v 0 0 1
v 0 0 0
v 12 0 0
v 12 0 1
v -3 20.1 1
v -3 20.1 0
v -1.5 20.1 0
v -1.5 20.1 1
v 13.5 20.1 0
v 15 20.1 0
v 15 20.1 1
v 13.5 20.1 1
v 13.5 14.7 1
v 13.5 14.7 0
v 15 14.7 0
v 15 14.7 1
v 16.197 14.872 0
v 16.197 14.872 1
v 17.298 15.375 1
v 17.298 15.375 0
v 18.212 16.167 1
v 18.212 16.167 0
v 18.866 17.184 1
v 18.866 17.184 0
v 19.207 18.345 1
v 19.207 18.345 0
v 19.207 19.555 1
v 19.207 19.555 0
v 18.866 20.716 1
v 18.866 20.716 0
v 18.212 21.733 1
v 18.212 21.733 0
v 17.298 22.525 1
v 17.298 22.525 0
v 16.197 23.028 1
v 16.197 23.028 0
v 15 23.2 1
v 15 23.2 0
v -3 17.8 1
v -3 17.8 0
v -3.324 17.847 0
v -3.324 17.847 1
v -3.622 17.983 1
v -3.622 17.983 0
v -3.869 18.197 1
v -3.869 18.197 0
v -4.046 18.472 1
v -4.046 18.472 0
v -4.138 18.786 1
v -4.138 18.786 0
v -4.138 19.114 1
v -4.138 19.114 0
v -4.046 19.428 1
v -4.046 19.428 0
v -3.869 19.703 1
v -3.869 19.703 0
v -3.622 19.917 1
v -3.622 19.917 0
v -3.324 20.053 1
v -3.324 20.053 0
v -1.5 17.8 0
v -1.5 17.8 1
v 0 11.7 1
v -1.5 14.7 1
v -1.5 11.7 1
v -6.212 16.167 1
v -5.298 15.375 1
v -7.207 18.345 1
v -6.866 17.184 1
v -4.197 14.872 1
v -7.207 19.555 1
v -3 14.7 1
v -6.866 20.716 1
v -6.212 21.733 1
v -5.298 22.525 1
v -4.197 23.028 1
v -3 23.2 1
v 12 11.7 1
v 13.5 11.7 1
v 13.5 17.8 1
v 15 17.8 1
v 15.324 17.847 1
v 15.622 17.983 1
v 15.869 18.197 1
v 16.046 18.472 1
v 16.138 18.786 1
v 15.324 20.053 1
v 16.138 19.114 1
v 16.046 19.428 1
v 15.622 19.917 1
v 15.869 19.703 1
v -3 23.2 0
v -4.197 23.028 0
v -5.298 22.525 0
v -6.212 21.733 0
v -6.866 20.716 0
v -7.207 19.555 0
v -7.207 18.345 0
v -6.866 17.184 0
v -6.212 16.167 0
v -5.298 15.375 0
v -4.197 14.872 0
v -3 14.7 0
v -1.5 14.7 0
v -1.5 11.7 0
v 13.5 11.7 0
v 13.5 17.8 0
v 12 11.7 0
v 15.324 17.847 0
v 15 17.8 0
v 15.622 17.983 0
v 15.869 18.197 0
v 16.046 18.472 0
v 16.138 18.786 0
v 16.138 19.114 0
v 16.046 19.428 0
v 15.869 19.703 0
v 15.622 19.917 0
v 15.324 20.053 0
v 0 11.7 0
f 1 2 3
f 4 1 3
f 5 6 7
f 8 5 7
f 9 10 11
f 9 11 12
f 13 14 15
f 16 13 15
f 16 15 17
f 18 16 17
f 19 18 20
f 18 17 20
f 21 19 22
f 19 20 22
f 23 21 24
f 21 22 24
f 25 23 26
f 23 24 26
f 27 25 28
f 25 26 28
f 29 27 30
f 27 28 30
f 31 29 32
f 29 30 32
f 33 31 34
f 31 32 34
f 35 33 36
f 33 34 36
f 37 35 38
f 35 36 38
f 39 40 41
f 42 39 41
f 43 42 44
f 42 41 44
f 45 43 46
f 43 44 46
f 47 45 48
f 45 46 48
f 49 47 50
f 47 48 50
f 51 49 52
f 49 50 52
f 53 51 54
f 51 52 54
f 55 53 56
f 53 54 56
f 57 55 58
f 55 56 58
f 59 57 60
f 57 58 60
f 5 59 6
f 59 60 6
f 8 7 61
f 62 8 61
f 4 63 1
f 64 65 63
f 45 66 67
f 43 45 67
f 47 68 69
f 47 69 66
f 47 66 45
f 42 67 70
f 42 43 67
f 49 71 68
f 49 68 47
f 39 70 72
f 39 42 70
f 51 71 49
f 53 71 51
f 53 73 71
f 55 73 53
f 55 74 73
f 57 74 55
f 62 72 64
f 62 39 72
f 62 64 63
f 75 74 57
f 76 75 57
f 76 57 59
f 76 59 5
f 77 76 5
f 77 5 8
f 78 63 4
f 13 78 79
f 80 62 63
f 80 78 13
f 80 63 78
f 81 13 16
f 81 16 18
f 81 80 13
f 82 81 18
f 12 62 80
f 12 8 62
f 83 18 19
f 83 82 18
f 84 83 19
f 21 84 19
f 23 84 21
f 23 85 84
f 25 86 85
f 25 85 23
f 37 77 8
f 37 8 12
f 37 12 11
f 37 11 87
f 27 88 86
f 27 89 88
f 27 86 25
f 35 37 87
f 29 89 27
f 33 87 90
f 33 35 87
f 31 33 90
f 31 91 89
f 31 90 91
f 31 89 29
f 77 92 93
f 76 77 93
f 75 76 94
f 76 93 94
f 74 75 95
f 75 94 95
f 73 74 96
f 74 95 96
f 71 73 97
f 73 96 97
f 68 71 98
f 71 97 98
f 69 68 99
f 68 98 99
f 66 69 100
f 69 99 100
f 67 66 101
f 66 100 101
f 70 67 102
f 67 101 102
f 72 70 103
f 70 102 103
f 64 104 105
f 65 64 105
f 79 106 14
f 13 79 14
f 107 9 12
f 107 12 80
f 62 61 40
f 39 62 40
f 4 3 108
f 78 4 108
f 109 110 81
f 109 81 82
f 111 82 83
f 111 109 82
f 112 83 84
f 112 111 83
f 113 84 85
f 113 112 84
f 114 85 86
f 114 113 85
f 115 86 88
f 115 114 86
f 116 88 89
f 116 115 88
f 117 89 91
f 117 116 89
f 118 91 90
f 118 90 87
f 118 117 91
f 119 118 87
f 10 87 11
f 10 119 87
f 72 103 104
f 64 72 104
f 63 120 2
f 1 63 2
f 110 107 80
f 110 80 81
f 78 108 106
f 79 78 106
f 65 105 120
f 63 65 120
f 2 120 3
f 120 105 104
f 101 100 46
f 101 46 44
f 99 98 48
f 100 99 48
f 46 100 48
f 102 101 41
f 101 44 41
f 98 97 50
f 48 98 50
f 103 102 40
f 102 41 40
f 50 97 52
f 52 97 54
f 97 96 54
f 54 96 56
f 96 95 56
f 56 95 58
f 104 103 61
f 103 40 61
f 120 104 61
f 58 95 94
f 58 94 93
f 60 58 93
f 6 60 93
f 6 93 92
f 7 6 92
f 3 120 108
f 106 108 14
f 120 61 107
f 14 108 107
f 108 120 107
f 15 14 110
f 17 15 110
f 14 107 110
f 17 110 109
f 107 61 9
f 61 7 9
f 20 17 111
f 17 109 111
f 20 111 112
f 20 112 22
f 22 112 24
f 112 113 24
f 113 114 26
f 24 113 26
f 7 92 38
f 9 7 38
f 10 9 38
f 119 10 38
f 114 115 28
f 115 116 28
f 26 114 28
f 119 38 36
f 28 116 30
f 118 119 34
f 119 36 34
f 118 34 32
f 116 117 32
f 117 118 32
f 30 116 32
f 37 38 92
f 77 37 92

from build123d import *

# Parameters (mm, degrees)
BOSS_EXTRU_1_DEPTH = 1


with BuildPart() as part:
    # Esquisse1 → Boss.-Extru.1 (new body)
    with BuildSketch(Plane.XY):
        with BuildLine():
            Line((12, 11.7), (13.5, 11.7))
            Line((13.5, 11.7), (13.5, 14.7))
            Line((13.5, 14.7), (15, 14.7))
            ThreePointArc((15, 14.7), (19.25, 18.95), (15, 23.2))
            Line((15, 23.2), (-3, 23.2))
            ThreePointArc((-3, 23.2), (-7.25, 18.95), (-3, 14.7))
            Line((-3, 14.7), (-1.5, 14.7))
            Line((-1.5, 14.7), (-1.5, 11.7))
            Line((-1.5, 11.7), (0, 11.7))
            Line((0, 11.7), (0, 0))
            Line((0, 0), (12, 0))
            Line((12, 0), (12, 11.7))
        make_face()
        with BuildLine():
            Line((15, 20.1), (13.5, 20.1))
            Line((13.5, 20.1), (13.5, 17.8))
            Line((13.5, 17.8), (15, 17.8))
            ThreePointArc((15, 17.8), (16.15, 18.95), (15, 20.1))
        make_face(mode=Mode.SUBTRACT)
        with BuildLine():
            Line((-3, 20.1), (-1.5, 20.1))
            Line((-1.5, 20.1), (-1.5, 17.8))
            Line((-1.5, 17.8), (-3, 17.8))
            ThreePointArc((-3, 17.8), (-4.15, 18.95), (-3, 20.1))
        make_face(mode=Mode.SUBTRACT)
    extrude(amount=BOSS_EXTRU_1_DEPTH)


solid = part.part
